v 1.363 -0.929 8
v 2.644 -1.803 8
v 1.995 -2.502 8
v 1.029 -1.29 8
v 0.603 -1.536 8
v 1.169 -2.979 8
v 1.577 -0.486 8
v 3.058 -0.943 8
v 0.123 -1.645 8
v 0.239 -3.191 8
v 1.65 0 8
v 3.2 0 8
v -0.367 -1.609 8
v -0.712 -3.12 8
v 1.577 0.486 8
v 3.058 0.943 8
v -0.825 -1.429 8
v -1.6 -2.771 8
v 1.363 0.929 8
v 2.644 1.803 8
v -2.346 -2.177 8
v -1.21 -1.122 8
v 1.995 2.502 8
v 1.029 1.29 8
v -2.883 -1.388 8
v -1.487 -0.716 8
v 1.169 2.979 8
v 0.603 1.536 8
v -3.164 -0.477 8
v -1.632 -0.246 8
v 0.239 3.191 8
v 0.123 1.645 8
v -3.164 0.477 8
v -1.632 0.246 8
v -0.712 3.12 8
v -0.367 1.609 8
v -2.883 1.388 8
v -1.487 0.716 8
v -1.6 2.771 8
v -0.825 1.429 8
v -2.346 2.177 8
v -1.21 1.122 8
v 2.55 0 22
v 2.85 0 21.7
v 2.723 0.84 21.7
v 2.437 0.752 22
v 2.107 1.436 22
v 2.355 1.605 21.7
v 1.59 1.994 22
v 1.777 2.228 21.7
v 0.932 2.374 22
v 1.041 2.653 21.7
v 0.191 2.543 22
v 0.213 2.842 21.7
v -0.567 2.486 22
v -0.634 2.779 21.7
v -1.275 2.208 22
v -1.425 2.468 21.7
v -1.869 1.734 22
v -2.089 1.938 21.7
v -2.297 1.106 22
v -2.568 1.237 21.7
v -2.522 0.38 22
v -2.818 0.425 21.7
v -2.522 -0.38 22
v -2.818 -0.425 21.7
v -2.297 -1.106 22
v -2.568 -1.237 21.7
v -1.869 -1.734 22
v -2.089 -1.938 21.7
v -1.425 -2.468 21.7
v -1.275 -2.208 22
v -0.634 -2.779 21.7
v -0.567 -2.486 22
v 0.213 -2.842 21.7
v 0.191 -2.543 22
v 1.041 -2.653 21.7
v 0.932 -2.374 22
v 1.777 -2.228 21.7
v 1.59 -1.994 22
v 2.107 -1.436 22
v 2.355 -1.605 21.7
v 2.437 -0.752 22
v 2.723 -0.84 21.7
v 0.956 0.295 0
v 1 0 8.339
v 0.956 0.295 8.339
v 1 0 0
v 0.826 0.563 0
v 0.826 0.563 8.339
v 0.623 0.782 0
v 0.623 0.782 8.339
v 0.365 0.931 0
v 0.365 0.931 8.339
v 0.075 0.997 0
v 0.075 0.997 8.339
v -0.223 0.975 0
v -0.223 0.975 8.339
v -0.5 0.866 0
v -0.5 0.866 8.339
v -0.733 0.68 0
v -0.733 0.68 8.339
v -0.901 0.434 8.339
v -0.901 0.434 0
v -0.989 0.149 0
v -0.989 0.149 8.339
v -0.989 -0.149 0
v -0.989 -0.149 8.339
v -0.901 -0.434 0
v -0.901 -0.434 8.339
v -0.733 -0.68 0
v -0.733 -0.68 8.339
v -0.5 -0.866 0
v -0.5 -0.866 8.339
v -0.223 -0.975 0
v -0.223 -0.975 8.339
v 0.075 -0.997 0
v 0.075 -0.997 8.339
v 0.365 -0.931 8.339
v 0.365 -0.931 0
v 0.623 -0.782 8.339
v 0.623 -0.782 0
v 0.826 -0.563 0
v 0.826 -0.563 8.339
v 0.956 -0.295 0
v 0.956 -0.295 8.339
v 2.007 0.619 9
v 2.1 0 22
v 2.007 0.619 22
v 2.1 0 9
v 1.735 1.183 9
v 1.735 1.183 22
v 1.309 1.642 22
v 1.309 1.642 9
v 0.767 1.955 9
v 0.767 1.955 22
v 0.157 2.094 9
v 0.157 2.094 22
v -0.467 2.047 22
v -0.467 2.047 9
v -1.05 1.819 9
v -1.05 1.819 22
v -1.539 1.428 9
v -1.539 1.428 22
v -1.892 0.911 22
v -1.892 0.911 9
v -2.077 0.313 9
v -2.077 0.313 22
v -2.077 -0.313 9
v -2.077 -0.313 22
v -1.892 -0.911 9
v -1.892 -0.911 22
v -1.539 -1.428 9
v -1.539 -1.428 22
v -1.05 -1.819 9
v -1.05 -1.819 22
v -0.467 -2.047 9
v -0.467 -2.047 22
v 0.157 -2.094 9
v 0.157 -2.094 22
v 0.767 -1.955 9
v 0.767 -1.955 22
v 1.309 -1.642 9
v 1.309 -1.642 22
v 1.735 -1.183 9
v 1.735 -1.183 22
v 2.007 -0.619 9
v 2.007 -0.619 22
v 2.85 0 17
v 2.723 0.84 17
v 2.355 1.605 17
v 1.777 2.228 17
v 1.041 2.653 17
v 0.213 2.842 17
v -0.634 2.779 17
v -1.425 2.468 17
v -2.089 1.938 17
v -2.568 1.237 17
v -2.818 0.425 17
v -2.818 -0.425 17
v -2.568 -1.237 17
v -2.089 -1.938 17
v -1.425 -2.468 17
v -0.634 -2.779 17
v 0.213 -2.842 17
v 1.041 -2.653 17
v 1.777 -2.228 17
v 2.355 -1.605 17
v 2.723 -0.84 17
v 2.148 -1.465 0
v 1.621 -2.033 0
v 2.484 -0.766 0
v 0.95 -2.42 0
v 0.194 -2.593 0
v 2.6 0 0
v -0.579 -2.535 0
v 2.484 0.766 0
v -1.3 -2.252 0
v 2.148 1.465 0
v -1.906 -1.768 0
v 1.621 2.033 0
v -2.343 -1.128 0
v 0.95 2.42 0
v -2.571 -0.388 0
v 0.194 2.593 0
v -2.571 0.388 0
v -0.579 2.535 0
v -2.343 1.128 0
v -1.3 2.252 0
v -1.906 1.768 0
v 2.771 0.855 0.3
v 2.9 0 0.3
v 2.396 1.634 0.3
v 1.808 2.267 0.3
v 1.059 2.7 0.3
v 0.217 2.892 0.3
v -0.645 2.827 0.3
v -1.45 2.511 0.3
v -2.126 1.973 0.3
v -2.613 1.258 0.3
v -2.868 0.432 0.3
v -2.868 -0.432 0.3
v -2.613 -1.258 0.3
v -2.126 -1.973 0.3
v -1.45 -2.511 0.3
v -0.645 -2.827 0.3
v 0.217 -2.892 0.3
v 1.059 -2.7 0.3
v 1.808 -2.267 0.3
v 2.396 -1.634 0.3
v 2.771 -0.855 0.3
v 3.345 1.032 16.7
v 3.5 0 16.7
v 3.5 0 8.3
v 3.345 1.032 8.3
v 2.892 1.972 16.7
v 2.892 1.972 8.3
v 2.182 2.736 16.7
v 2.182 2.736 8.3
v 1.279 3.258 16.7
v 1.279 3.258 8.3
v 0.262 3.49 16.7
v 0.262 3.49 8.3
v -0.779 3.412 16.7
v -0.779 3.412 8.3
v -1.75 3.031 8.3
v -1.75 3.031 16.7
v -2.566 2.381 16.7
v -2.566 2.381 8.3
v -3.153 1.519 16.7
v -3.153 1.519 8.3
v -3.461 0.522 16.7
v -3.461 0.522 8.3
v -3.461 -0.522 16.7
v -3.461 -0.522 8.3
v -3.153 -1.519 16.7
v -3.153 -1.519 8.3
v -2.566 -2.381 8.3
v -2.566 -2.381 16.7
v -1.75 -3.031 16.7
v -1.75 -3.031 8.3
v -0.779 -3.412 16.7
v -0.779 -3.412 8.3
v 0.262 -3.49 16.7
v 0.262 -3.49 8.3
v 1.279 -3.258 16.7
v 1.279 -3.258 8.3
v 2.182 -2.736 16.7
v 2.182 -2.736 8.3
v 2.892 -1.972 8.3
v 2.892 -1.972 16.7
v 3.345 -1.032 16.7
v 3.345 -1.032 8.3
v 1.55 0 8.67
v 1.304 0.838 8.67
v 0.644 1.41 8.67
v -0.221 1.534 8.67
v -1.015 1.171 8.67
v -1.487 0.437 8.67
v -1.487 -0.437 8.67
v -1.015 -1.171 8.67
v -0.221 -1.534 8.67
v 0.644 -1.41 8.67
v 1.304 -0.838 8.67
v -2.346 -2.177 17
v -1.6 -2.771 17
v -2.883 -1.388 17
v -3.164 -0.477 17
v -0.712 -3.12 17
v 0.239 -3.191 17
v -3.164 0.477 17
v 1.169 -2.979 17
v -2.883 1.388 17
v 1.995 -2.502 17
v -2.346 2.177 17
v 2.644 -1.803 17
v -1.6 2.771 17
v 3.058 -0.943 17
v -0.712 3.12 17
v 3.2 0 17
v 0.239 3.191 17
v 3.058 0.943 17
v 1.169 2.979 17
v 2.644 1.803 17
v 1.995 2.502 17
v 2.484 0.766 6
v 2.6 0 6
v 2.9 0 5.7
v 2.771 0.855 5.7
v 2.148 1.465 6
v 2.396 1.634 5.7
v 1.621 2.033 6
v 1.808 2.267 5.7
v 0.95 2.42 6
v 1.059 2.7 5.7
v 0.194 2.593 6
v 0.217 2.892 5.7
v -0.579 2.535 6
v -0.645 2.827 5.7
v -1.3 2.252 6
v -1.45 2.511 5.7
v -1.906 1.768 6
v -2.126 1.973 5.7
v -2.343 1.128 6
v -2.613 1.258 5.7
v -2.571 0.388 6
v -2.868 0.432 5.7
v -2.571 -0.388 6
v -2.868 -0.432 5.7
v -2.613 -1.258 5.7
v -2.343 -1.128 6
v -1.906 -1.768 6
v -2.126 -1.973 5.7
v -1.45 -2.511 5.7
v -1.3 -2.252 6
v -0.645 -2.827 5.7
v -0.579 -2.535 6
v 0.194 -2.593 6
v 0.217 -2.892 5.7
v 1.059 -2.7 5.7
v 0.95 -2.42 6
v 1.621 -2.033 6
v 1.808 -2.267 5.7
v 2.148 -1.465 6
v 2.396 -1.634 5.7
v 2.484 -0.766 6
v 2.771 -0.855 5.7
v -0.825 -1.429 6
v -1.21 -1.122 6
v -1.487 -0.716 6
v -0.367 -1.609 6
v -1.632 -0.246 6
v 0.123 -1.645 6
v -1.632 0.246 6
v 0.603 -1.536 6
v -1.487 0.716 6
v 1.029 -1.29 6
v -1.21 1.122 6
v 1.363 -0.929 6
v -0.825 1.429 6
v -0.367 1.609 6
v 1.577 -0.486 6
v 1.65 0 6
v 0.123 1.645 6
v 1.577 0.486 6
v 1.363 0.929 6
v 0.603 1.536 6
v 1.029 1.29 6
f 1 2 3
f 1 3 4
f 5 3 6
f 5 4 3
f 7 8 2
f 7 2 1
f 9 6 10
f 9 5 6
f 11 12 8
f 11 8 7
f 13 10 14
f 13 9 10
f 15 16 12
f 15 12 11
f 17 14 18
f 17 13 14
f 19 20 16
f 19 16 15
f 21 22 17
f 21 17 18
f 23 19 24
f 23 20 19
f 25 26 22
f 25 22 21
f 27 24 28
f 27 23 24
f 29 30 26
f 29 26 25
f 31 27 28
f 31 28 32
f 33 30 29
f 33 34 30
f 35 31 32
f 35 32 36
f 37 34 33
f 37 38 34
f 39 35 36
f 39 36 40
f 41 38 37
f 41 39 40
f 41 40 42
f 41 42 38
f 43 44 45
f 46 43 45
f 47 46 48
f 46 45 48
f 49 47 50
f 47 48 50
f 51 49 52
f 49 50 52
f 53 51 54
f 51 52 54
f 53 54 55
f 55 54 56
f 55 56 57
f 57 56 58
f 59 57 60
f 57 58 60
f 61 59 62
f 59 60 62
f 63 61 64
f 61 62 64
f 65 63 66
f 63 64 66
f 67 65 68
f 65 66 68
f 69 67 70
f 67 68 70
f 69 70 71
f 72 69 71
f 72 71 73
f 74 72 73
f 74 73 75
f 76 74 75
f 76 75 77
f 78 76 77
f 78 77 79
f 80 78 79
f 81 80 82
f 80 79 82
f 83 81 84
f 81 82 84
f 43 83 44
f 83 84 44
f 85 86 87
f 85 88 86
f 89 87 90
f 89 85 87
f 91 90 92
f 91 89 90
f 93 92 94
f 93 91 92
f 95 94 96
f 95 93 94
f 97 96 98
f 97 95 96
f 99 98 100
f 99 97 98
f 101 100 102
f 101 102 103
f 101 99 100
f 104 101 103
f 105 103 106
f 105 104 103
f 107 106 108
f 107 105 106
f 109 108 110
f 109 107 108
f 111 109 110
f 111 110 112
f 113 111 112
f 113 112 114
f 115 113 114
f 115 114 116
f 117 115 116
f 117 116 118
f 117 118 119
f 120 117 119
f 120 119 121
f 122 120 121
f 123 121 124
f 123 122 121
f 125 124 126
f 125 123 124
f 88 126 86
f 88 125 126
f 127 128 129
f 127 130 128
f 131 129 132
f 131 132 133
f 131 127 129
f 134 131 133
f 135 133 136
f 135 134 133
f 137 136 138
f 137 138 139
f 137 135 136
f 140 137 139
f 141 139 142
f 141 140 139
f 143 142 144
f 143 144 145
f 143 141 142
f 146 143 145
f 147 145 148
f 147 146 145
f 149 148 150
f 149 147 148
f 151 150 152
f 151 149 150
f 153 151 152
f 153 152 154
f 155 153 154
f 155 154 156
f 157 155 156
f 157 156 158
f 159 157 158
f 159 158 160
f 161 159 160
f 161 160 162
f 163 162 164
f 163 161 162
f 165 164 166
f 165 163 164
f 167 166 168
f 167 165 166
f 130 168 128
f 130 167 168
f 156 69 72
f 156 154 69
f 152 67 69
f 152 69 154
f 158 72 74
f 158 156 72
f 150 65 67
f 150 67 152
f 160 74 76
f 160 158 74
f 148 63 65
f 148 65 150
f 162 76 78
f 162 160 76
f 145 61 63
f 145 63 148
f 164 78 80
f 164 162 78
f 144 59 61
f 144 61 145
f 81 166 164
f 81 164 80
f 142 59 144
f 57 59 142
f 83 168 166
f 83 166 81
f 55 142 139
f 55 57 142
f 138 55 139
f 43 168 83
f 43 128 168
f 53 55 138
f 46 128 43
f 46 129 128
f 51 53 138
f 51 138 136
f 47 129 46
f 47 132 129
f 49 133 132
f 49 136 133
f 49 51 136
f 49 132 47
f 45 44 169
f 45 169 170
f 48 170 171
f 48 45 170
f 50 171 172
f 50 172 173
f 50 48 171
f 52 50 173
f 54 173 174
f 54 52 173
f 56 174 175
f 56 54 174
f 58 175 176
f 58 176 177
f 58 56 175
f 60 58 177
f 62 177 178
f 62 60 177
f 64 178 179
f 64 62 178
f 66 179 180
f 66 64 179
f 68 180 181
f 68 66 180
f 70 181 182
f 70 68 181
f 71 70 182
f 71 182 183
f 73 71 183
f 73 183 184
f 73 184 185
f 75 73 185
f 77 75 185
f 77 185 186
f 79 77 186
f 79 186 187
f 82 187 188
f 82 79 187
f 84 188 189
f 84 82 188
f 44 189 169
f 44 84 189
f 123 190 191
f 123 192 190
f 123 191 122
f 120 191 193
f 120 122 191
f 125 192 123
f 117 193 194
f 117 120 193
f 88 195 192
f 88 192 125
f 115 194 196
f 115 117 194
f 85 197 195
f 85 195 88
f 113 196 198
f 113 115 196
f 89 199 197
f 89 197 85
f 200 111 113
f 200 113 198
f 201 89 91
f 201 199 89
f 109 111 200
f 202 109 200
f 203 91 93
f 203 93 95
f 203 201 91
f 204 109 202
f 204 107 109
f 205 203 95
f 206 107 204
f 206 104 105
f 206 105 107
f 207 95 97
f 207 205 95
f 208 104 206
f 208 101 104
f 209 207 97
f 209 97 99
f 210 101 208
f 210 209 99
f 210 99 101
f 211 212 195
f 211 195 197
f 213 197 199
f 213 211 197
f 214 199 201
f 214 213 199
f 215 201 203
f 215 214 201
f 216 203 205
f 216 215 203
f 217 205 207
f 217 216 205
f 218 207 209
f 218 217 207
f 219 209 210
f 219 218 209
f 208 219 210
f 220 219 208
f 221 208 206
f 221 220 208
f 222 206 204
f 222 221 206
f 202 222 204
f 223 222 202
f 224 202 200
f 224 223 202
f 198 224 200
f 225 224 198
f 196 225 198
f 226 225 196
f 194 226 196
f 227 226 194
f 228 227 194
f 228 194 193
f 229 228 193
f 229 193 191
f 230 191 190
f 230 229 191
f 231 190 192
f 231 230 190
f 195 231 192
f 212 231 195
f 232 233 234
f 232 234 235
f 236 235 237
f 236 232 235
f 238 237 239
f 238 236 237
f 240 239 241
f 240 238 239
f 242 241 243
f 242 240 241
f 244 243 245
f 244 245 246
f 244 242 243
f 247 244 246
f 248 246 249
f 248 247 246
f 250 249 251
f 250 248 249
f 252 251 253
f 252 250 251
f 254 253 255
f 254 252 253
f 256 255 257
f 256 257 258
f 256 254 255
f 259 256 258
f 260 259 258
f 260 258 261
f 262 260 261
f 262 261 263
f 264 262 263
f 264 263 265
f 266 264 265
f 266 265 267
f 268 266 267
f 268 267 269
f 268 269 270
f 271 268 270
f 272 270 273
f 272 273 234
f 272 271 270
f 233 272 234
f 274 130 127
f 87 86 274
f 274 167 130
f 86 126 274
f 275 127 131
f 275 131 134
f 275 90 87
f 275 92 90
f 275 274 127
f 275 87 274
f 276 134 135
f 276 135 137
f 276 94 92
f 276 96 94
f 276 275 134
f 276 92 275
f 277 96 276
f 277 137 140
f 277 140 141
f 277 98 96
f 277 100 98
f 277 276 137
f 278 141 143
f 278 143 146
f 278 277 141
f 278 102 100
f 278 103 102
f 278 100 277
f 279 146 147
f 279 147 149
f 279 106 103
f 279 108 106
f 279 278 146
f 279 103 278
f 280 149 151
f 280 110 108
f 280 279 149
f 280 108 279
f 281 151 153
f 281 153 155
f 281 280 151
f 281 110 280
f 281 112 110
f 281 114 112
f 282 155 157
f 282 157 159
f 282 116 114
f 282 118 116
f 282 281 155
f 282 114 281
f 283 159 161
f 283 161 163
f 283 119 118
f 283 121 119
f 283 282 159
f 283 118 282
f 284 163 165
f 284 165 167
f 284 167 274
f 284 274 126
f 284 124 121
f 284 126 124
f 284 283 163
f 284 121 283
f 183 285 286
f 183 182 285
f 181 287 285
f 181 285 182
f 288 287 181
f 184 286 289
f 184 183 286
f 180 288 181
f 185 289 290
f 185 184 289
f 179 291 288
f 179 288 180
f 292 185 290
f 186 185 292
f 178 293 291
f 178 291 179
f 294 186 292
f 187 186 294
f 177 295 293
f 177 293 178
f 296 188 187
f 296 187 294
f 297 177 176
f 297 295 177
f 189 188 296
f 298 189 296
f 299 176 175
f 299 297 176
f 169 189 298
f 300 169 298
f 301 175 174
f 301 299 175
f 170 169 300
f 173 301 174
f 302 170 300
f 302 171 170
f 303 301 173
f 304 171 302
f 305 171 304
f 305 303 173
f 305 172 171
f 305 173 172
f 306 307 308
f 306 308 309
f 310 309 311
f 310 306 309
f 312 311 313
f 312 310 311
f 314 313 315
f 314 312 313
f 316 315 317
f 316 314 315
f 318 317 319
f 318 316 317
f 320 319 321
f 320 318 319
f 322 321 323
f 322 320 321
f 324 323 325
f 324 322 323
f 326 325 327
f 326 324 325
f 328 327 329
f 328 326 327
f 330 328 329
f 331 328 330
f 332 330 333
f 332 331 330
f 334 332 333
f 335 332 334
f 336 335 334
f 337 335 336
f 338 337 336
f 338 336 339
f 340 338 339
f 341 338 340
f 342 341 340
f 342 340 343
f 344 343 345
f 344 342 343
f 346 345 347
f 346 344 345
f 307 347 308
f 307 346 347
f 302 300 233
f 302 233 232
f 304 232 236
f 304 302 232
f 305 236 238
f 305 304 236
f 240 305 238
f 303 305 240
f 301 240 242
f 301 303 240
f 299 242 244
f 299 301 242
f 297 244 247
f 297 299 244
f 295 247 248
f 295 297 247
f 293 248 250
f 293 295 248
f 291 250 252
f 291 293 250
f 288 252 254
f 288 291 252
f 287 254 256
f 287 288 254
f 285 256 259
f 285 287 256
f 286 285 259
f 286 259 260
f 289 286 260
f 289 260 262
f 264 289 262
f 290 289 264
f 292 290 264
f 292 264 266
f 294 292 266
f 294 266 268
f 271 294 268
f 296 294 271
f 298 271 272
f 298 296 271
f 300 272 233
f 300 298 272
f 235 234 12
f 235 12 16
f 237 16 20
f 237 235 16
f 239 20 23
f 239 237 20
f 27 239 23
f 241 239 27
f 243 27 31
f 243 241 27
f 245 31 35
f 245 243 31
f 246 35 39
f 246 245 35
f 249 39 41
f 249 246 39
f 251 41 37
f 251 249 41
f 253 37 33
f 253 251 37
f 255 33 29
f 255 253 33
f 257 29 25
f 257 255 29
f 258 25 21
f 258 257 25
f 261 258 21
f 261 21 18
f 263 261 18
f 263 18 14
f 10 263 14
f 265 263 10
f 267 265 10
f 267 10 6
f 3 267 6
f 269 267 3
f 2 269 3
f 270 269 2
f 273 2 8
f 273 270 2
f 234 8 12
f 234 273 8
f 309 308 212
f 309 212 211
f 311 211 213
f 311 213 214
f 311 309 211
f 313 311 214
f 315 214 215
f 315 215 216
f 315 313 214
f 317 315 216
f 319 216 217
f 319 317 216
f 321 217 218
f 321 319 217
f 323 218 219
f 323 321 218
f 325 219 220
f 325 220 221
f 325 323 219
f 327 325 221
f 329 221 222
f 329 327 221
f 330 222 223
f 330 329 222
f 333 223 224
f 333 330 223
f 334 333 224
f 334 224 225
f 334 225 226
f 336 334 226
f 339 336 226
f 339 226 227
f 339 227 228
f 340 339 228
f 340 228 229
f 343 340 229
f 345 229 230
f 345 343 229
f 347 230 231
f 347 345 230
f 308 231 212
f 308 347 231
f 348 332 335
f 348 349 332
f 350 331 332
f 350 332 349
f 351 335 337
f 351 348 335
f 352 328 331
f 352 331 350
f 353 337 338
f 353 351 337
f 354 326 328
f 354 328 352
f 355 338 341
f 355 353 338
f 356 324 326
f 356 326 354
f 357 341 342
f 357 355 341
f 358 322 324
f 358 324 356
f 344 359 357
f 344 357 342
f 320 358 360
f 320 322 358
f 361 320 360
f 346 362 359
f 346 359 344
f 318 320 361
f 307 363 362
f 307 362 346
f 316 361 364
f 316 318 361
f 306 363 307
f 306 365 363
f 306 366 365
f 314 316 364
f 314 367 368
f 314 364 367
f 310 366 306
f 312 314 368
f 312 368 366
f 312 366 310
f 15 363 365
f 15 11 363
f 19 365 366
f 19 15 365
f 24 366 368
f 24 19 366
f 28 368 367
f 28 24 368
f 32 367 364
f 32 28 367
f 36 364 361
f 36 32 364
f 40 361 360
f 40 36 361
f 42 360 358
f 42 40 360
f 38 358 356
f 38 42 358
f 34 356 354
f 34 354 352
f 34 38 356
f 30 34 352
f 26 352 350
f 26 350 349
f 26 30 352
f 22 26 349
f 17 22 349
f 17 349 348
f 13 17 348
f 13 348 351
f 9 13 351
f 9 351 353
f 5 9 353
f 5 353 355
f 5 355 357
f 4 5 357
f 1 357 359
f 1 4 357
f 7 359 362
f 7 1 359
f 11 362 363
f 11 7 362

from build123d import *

# Parameters (mm, degrees)
F2_SIZE = 0.3


with BuildPart() as f1:
    # F0 (on Front) → F1 (revolve)
    with BuildSketch(Plane.XZ):
        Polygon((2.85, 22), (2.1, 22), (2.1, 9), (1, 8.339053), (1, 0), (2.9, 0), (2.9, 6), (1.65, 6), (1.65, 8), (3.5, 8), (3.5, 17), (2.85, 17), align=None)
    revolve(axis=Axis((0, 0, 11), (0, 0, 1)))

    # F2
    f2_edges = [f1.edges().sort_by_distance(p)[0] for p in [
        (-2.85, 0, 22),
        (-3.5, 0, 17),
        (-3.5, 0, 8),
        (-2.9, 0, 6),
        (-2.9, 0, 0),
    ]]
    chamfer(f2_edges, length=F2_SIZE)


solid = f1.part
